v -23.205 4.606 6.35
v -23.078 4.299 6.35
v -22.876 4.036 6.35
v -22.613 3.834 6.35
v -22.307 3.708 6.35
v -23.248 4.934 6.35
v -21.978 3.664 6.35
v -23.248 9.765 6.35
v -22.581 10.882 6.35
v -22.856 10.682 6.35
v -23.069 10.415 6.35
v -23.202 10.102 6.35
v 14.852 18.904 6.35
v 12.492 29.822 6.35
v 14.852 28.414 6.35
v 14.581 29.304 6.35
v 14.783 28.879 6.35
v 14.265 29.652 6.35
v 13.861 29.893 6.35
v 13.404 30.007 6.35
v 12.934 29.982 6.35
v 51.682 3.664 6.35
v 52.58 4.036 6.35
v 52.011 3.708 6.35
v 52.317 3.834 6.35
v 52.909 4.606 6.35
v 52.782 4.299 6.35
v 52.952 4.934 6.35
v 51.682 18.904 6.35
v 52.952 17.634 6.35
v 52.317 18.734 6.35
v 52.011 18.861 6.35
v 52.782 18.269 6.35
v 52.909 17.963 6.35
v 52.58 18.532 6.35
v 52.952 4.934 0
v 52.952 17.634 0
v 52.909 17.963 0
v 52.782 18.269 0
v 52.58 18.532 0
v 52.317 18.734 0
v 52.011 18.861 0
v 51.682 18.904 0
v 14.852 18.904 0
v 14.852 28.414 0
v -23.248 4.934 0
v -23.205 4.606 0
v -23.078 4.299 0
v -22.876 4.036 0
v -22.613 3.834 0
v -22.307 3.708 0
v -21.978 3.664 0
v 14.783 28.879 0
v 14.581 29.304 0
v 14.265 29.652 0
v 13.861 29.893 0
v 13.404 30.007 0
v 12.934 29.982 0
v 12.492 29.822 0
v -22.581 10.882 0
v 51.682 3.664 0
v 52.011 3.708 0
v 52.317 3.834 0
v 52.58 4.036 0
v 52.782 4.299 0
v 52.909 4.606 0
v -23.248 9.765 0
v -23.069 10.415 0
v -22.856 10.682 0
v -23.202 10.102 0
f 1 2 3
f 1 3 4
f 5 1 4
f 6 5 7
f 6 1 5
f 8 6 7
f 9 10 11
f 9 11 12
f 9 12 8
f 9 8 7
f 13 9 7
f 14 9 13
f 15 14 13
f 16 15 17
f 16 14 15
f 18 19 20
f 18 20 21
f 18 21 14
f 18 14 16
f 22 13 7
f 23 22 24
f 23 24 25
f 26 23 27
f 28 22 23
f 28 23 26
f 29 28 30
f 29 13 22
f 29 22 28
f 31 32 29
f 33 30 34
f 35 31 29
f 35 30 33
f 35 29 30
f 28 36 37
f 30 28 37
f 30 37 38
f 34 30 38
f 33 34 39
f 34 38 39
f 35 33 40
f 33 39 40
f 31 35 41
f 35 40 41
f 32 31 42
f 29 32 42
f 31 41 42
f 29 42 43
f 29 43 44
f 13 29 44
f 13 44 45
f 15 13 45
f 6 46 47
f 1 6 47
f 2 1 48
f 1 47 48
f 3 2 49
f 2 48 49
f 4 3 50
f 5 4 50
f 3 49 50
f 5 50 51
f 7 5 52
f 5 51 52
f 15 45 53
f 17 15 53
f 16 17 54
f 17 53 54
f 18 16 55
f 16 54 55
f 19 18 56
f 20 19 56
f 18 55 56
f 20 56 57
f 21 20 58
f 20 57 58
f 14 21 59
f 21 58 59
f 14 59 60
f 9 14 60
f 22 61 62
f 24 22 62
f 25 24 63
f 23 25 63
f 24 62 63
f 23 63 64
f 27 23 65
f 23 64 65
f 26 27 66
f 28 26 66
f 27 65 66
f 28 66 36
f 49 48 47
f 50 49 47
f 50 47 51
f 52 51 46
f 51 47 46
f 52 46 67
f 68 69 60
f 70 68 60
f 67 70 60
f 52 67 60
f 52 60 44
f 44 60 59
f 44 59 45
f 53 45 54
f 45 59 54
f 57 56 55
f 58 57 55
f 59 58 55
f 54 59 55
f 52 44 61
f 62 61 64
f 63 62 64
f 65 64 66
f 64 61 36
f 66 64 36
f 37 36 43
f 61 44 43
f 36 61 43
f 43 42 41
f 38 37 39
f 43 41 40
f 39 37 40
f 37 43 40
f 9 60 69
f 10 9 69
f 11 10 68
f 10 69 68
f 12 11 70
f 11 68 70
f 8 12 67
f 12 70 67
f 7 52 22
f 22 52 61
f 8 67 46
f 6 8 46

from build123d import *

# Parameters (mm, degrees)
F1_DEPTH = 6.35


with BuildPart() as f1:
    # F0 (on Top) → F1 (new body)
    with BuildSketch(Plane.XY):
        with BuildLine():
            ThreePointArc((52.952157, 17.634291), (52.580183, 18.532317), (51.682157, 18.904291))
            Line((51.682157, 18.904291), (14.852157, 18.904291))
            Line((14.852157, 18.904291), (14.852157, 28.413579))
            ThreePointArc((14.852157, 28.413579), (14.0717, 29.787865), (12.491624, 29.821603))
            Line((12.491624, 29.821603), (-22.581282, 10.882234))
            ThreePointArc((-22.581282, 10.882234), (-23.068546, 10.415343), (-23.247843, 9.764754))
            Line((-23.247843, 9.764754), (-23.247843, 4.934291))
            ThreePointArc((-23.247843, 4.934291), (-22.875868, 4.036266), (-21.977843, 3.664291))
            Line((-21.977843, 3.664291), (51.682157, 3.664291))
            ThreePointArc((51.682157, 3.664291), (52.580183, 4.036266), (52.952157, 4.934291))
            Line((52.952157, 4.934291), (52.952157, 17.634291))
        make_face()
    extrude(amount=F1_DEPTH)


solid = f1.part
